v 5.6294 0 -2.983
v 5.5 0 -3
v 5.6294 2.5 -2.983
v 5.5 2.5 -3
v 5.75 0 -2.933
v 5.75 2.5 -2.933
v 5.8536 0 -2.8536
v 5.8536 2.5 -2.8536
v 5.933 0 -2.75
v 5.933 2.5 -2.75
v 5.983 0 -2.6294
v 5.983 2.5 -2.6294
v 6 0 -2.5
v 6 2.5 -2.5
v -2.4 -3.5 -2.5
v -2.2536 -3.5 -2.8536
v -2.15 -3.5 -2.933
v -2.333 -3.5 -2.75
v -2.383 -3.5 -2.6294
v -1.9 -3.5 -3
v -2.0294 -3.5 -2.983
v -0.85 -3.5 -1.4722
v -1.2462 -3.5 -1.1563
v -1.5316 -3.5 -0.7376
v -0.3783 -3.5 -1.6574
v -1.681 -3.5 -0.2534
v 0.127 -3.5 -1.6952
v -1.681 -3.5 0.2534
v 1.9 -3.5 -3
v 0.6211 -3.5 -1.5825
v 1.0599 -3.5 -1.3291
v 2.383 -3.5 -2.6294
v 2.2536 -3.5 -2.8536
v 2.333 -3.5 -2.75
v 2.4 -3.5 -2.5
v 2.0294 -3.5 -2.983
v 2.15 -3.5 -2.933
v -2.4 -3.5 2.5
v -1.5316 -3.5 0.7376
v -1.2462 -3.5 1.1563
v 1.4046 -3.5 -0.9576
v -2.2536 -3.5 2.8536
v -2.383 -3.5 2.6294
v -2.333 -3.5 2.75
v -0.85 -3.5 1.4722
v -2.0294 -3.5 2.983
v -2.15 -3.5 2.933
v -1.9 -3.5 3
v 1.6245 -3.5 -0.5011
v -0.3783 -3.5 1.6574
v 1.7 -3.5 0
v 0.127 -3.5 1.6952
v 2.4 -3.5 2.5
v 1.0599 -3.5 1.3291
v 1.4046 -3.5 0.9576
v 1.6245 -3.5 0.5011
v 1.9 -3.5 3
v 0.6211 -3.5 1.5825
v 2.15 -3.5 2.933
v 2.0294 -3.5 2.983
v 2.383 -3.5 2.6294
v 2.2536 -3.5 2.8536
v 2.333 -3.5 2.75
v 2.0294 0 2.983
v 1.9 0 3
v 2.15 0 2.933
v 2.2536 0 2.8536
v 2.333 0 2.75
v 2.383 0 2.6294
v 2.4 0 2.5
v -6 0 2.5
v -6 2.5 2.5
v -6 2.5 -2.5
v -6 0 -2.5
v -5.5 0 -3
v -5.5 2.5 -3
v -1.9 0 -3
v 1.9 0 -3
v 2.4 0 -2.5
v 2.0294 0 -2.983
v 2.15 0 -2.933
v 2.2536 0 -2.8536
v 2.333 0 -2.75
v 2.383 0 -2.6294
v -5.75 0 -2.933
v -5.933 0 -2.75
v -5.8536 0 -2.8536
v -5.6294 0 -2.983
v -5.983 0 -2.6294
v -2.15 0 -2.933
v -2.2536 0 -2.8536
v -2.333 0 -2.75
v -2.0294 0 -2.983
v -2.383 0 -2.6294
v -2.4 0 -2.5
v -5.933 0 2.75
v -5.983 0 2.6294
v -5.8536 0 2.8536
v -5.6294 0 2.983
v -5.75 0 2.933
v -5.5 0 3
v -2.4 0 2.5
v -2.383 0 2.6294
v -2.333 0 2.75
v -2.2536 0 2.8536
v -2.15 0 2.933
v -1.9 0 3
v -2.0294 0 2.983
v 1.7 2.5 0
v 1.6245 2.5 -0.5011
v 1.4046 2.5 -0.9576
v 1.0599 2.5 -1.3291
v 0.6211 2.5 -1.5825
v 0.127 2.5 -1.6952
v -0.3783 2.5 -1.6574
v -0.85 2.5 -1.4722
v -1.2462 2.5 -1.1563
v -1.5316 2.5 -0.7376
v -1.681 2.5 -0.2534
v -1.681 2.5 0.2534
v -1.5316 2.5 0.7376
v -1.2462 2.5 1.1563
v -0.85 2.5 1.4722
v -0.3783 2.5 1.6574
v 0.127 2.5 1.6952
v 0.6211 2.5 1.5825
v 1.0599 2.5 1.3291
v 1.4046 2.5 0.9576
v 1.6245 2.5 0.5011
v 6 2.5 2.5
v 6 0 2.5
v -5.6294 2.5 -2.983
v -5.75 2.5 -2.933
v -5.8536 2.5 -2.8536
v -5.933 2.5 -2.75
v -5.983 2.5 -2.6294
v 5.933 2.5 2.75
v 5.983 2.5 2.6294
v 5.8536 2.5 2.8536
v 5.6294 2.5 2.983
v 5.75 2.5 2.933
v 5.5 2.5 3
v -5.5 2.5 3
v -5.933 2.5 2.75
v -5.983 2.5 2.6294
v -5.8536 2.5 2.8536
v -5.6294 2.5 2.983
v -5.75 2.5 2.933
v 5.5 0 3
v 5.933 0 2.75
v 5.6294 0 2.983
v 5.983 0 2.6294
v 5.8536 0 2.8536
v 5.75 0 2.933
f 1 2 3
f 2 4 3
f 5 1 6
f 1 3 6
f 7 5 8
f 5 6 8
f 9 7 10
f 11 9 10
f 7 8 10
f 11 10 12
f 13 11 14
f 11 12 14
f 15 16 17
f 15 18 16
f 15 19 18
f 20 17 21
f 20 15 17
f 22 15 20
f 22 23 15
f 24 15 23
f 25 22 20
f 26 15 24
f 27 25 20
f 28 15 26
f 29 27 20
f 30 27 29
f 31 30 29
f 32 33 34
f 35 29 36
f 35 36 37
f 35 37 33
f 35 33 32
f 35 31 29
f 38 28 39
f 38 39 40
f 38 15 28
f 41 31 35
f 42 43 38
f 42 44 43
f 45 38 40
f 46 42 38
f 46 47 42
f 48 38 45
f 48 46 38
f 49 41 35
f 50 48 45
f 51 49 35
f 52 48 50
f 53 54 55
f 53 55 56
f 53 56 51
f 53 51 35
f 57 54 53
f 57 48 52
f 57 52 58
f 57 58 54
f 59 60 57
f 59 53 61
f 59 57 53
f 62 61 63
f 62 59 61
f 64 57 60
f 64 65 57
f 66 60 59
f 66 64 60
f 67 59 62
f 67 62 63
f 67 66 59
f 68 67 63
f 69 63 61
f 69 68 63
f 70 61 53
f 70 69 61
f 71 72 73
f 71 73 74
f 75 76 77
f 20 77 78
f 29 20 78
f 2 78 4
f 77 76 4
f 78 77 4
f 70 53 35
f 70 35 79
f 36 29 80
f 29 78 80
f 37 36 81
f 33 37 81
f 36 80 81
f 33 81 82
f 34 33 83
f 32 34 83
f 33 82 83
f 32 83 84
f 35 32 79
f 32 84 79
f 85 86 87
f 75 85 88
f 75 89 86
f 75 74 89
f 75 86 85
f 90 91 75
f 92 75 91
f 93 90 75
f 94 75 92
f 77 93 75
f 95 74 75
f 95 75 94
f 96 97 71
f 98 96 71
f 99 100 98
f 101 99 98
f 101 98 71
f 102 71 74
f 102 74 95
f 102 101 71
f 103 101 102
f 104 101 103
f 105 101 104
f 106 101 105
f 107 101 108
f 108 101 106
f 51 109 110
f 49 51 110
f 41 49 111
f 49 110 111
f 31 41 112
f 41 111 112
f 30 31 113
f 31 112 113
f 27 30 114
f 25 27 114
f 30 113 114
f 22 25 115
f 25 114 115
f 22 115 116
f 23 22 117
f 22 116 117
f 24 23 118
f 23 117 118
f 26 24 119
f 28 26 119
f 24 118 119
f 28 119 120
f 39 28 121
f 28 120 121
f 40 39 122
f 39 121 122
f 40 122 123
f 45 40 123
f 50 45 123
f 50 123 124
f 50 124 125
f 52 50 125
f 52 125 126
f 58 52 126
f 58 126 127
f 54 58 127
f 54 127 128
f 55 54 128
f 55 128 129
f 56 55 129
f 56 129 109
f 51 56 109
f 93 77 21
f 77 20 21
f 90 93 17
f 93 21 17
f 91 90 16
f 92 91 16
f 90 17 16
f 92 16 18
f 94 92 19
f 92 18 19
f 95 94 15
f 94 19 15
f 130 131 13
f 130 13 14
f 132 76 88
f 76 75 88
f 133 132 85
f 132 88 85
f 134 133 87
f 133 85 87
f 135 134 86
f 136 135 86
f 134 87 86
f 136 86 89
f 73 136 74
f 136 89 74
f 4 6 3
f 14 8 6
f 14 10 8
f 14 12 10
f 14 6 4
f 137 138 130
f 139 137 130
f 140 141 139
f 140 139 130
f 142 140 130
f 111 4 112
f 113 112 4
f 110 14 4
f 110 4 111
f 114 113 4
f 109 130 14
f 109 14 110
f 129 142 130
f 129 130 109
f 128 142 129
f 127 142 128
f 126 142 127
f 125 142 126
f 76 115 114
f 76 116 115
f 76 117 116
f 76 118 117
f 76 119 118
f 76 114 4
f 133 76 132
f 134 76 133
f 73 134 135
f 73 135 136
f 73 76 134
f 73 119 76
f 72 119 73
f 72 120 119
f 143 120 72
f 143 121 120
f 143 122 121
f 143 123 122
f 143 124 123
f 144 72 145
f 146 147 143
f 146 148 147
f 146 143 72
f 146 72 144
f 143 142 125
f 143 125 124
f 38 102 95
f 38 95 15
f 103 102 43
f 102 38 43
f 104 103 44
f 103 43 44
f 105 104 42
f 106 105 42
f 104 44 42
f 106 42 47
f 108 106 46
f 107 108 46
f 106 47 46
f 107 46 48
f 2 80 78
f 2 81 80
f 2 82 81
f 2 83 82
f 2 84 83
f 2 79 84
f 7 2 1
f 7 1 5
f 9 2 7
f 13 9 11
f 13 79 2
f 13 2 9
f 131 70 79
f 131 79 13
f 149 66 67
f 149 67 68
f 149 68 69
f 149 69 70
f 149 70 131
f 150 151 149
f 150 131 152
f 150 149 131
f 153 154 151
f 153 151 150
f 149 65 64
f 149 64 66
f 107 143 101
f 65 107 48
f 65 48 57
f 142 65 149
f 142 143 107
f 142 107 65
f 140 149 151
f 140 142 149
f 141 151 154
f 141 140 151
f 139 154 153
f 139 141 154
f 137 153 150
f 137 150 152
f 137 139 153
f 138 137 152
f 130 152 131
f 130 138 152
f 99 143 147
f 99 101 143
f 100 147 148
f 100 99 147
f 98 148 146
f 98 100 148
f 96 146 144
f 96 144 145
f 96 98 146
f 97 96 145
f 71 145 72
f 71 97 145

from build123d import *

# Parameters (mm, degrees)
BOSS_EXTRU_1_DEPTH      = 3
ESQUISSE2_R             = 1.7
ENL_V_MAT_EXTRU_1_DEPTH = 7
CONG_2_R                = 0.5


with BuildPart() as part:
    # Esquisse1 → Boss.-Extru.1 (new body, symmetric)
    with BuildSketch(Plane.XY):
        Polygon((-6, 0), (-2.4, 0), (-2.4, -3.5), (2.4, -3.5), (2.4, 0), (6, 0), (6, 2.5), (-6, 2.5), align=None)
    extrude(amount=BOSS_EXTRU_1_DEPTH, both=True)

    # Esquisse2 → Enlèv. mat.-Extru.1 (cut, through all)
    with BuildSketch(Plane(origin=(0, 2.5, 0), x_dir=(1, 0, 0), z_dir=(0, 1, 0))):
        Circle(ESQUISSE2_R)
    extrude(amount=-ENL_V_MAT_EXTRU_1_DEPTH, mode=Mode.SUBTRACT)

    # Congé2
    cong_2_edges = [part.edges().sort_by_distance(p)[0] for p in [
        (-6, 1.25, -3),
        (6, 1.25, -3),
        (-6, 1.25, 3),
        (-2.4, -1.75, 3),
        (2.4, -1.75, 3),
        (6, 1.25, 3),
        (2.4, -1.75, -3),
        (-2.4, -1.75, -3),
    ]]
    fillet(cong_2_edges, radius=CONG_2_R)


solid = part.part
